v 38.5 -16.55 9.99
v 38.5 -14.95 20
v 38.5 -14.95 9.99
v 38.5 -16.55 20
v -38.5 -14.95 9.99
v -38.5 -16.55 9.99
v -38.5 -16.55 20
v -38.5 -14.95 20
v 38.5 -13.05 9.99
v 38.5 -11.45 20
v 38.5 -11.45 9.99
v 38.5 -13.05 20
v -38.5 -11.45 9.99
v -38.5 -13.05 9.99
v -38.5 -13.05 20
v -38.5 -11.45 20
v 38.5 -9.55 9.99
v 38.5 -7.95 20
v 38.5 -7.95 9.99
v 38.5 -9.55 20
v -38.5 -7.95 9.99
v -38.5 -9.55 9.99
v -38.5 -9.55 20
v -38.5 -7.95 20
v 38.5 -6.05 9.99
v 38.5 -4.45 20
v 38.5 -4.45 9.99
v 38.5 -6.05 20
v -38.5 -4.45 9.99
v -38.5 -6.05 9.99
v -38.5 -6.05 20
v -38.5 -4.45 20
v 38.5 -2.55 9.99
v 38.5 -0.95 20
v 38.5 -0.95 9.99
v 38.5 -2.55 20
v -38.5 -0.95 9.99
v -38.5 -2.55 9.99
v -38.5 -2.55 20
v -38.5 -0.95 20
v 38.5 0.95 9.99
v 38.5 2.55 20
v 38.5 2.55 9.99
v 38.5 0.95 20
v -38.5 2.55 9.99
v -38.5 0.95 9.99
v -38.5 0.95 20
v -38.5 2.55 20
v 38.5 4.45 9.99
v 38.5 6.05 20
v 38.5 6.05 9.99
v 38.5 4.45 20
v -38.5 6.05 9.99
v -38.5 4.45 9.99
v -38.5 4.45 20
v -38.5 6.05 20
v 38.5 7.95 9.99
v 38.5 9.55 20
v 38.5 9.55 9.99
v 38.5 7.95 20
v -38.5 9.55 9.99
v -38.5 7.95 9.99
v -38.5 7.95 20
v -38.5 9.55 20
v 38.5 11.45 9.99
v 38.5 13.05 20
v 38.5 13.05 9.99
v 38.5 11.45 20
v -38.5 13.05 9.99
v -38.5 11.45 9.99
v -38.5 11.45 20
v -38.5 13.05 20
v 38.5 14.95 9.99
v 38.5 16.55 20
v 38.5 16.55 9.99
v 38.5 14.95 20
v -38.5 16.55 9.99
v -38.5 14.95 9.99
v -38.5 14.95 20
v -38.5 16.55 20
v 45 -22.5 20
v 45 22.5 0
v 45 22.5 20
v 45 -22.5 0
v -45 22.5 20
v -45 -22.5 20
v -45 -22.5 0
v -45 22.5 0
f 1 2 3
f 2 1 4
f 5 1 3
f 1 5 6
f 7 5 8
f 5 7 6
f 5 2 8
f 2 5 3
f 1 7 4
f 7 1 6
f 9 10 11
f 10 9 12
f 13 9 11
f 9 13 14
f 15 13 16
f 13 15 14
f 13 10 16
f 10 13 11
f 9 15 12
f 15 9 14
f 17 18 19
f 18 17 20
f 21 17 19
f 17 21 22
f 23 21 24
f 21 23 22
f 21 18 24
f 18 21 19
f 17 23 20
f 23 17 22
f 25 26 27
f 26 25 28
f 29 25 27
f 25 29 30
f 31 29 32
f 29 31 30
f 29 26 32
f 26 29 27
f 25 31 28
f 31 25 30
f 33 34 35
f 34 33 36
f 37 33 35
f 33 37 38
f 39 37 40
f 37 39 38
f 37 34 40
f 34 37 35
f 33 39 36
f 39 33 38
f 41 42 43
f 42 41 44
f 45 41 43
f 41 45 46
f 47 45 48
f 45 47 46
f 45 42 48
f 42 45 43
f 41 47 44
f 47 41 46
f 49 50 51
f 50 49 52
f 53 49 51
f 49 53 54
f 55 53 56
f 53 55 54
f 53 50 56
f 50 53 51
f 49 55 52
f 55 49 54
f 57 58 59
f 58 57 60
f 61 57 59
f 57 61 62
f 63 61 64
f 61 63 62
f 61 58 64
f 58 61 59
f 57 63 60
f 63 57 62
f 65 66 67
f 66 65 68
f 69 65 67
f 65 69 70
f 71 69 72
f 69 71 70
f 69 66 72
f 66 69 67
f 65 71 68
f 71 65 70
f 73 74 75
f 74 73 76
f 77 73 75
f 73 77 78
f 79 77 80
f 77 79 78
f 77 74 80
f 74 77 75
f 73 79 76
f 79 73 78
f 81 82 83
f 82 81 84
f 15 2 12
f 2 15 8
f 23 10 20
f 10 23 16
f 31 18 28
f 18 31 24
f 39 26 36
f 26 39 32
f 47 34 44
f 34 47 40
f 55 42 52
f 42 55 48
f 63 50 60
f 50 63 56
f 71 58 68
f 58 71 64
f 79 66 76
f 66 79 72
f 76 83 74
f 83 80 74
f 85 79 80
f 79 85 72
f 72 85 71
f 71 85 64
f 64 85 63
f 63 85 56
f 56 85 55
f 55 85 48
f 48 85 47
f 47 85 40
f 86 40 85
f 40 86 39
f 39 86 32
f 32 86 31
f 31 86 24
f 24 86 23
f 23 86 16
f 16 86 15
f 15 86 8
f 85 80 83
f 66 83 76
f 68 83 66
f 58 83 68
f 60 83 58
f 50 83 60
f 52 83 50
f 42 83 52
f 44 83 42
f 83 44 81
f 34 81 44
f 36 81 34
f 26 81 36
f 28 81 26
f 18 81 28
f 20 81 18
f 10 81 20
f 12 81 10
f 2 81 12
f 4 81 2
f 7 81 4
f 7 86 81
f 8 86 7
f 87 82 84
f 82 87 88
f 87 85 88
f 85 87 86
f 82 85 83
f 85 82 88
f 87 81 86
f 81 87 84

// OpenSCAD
// ---------- Parameters ----------
block_len   = 90;    // X dimension of base block (mm)
block_wid   = 45;    // Y dimension of base block (mm)
block_hgt   = 20;    // Z dimension of base block (mm)

slot_len    = 77;    // Length of each slot along X (mm)
slot_wid    = 1.6;   // Width of each slot along Y (mm)
slot_depth  = 10;    // Depth of each slot into the block (mm)

slot_spacing = 3.5; // Centre‑to‑centre spacing of slots in Y (mm)
slot_count   = 10;  // Number of slots

cut_extra = 0.01;    // Extra amount for cutting shapes to extend beyond faces (mm)

// ---------- Derived values ----------
slot_y_start = -((slot_count-1)/2) * slot_spacing; // first centre Y position (mm)

// ---------- Modules ----------
module base_block() {
    // Block centred on the origin, resting on the XY plane (z = 0)
    translate([-block_len/2, -block_wid/2, 0])
        cube([block_len, block_wid, block_hgt]);
}

module slot_cut(i) {
    // Compute centre Y for slot i
    y_center = slot_y_start + i*slot_spacing;
    // Translate slot so that its lower corner is at the correct position
    translate([
        -slot_len/2,                     // X: centred on origin
        y_center - slot_wid/2,           // Y: centred on its centre
        block_hgt - slot_depth - cut_extra // Z: bottom just below the top face
    ])
        // Cutting prism, extended a little beyond top and bottom faces
        cube([slot_len, slot_wid, slot_depth + 2*cut_extra]);
}

// ---------- Model ----------
$fn = 64; // smoothness for cylinders/spheres (not used here)

difference() {
    base_block();
    // Create all slots
    for (i = [0 : slot_count-1])
        slot_cut(i);
}
